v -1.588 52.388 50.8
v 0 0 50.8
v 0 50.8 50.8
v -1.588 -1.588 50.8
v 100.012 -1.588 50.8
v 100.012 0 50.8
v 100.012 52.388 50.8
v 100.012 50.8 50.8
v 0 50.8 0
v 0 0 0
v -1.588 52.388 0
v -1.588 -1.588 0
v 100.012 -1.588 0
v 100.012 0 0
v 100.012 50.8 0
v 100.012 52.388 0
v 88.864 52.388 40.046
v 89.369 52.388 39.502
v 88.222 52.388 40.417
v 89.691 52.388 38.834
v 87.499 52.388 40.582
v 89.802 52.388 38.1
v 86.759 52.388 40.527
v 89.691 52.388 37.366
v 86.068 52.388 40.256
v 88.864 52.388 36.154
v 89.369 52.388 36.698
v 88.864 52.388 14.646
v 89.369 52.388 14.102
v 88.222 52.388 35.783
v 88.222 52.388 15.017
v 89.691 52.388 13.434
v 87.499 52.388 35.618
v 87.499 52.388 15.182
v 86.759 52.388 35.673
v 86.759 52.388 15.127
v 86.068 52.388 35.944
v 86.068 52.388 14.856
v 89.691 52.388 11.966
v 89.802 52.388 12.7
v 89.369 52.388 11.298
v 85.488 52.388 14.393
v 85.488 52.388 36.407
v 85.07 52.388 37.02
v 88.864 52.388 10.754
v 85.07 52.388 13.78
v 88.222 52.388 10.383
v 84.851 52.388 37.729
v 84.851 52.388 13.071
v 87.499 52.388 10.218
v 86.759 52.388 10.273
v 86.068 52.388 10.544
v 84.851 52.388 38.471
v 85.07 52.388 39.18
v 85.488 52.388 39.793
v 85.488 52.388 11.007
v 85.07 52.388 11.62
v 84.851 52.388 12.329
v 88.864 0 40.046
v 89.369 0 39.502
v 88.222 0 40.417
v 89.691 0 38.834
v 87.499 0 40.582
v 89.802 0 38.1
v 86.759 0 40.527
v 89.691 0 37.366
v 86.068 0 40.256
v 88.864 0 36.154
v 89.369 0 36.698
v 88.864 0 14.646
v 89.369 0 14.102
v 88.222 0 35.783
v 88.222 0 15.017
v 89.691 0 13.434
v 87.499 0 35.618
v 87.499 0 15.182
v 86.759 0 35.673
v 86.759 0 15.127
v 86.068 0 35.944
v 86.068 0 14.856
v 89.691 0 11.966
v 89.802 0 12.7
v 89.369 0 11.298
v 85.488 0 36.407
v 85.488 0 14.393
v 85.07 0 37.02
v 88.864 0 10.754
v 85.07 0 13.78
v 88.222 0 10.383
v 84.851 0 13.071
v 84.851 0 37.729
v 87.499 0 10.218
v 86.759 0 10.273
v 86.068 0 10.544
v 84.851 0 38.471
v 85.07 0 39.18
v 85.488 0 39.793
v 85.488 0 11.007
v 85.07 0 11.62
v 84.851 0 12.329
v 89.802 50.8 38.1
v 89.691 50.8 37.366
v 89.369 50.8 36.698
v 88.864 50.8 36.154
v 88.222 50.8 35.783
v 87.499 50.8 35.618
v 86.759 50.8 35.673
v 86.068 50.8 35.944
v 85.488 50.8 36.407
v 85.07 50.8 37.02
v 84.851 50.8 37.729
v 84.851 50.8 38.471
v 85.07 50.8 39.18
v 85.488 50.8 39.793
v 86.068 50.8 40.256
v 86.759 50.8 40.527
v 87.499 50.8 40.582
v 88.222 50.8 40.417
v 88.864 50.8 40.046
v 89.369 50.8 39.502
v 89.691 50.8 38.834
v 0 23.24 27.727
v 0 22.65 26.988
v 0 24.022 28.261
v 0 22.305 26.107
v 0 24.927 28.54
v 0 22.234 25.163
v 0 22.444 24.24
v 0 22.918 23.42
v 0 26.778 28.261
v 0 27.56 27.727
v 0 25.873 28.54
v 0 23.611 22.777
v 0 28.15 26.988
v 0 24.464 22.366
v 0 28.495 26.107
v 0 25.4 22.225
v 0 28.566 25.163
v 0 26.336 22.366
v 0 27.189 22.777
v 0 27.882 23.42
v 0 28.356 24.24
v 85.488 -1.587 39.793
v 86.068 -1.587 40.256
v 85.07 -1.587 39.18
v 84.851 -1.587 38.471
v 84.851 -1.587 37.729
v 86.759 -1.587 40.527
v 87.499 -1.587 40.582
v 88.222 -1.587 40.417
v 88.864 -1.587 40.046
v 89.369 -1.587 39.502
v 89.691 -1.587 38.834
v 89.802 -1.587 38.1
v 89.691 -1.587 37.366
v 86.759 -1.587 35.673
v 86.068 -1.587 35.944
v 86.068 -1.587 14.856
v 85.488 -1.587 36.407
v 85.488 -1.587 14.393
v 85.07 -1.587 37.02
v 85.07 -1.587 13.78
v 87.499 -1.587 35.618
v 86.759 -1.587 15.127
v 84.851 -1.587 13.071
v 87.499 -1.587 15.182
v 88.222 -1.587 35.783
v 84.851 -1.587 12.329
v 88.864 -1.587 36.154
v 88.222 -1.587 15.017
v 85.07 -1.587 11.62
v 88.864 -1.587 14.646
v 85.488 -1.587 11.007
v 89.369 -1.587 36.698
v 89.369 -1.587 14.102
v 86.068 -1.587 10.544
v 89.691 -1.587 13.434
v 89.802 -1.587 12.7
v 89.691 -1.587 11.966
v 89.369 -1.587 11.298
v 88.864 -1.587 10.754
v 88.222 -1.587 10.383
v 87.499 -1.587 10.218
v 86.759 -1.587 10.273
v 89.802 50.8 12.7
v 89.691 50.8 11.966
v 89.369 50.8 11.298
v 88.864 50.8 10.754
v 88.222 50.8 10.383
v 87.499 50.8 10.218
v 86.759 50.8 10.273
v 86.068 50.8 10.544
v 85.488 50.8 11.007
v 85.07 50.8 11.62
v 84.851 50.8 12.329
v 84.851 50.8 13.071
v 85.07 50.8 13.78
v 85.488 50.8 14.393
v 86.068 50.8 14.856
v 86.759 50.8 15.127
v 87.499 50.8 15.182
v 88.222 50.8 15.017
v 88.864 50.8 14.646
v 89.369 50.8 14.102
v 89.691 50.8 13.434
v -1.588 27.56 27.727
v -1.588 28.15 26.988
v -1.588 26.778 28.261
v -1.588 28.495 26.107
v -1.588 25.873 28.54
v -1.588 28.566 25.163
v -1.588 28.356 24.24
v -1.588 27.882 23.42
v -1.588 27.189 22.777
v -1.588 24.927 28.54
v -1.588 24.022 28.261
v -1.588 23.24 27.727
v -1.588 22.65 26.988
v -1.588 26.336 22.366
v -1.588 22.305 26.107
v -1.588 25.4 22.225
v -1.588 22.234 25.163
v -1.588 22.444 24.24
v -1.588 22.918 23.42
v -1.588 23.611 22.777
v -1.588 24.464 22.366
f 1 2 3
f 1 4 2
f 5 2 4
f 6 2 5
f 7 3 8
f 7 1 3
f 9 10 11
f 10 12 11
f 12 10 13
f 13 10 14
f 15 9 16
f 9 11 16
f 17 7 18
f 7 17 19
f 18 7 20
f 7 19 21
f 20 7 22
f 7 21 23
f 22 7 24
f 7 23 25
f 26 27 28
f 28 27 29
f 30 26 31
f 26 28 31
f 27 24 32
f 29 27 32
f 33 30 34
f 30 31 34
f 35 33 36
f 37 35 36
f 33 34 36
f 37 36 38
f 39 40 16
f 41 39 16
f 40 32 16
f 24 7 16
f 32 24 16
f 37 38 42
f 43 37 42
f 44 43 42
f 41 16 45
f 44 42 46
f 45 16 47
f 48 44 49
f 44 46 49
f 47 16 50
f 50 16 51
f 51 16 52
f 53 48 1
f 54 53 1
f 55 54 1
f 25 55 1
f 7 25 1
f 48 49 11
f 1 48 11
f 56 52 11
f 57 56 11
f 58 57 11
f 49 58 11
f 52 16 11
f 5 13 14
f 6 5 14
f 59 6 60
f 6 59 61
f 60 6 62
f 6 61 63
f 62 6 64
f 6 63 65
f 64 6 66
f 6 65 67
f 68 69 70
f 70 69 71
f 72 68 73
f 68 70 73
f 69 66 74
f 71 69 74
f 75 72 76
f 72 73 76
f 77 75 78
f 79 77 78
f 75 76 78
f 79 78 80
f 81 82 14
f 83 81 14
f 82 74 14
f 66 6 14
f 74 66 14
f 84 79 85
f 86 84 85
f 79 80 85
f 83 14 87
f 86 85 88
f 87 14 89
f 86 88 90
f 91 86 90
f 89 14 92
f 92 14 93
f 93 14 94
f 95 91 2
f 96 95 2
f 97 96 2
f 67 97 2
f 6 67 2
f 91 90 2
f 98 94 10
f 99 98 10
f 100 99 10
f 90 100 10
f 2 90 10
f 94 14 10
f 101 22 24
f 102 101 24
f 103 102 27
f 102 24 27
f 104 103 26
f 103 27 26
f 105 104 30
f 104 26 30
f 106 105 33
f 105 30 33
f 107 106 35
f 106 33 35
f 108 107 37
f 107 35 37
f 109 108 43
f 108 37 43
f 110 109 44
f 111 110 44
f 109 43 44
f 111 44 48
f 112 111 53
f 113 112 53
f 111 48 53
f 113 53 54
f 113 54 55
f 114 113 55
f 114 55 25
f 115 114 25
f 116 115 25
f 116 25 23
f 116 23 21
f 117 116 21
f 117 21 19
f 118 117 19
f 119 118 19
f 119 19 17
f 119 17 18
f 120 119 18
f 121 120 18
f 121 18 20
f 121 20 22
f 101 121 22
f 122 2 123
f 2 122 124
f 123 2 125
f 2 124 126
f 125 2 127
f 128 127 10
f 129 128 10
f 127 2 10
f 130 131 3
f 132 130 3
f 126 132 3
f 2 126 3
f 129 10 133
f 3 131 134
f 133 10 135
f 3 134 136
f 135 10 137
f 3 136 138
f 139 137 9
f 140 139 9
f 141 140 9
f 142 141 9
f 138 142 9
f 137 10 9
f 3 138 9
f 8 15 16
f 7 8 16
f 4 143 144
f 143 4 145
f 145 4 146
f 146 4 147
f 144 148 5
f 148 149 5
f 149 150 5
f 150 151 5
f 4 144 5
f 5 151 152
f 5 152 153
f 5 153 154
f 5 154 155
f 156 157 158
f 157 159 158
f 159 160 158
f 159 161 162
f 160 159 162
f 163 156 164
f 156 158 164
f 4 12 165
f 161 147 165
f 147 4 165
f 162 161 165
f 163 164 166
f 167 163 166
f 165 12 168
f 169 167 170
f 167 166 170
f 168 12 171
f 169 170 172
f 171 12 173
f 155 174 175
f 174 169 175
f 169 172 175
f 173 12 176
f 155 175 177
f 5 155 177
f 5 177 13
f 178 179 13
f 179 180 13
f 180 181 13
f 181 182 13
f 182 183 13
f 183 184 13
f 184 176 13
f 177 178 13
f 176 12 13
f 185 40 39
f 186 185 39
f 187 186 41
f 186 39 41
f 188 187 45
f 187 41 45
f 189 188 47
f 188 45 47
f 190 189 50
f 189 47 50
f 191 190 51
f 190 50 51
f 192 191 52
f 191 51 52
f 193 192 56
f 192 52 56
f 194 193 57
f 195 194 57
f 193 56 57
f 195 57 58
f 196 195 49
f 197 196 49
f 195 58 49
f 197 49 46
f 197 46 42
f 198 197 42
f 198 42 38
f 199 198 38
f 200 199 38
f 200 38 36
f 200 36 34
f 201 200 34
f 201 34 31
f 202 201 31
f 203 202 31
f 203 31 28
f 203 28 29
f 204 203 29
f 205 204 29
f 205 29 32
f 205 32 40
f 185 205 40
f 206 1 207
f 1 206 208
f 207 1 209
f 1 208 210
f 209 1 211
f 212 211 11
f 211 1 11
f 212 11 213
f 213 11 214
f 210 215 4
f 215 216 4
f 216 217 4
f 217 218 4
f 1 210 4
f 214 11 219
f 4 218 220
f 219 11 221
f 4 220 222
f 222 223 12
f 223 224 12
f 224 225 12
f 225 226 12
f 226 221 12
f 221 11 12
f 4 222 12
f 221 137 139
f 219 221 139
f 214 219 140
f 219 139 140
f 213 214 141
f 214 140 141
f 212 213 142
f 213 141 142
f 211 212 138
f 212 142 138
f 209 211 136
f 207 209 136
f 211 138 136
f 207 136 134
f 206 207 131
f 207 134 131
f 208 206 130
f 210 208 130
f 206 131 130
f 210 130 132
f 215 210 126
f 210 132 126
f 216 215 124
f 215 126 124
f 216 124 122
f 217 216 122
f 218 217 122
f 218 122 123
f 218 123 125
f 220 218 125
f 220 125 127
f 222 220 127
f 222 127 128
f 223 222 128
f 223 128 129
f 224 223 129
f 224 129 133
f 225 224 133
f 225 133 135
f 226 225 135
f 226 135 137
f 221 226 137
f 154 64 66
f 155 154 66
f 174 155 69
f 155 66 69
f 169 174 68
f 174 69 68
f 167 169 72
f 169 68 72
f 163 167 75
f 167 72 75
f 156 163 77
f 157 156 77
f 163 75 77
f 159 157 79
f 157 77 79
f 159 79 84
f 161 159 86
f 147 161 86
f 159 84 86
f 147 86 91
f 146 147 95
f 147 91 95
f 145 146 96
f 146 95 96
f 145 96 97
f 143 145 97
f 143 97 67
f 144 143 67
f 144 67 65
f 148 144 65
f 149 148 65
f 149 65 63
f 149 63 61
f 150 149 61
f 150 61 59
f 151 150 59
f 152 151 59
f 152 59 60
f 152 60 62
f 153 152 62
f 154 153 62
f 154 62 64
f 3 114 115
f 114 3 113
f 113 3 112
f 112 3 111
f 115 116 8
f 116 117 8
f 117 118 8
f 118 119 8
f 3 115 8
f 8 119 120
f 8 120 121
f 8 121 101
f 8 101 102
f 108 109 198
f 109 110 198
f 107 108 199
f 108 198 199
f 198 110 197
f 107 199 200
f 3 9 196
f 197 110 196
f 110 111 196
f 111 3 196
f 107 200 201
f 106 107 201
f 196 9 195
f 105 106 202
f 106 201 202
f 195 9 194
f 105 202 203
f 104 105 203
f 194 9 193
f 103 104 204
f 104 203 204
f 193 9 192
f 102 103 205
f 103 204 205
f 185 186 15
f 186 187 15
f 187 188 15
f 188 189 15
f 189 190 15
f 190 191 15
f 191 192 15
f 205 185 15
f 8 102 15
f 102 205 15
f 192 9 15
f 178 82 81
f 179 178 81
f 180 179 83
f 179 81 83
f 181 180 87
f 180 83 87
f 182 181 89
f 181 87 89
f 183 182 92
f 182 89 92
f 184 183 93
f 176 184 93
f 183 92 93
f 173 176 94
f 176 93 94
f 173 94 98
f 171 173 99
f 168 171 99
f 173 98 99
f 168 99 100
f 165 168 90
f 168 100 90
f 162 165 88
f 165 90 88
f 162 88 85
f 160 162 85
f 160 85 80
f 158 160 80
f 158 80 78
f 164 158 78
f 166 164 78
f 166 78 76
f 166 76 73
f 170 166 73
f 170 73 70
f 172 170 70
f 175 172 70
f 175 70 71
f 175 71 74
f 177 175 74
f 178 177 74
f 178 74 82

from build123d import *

# Parameters (mm, degrees)
BOSS_EXTRUDE1_DEPTH = 50.8
SKETCH3_R           = 2.4892
CUT_EXTRUDE1_DEPTH  = 54.975
SKETCH4_R           = 3.175
CUT_EXTRUDE2_DEPTH  = 2.5875


with BuildPart() as part:
    # Sketch2 → Boss-Extrude1 (new body)
    with BuildSketch(Plane.XY):
        Polygon((-1.5875, -1.5875), (100.0125, -1.5875), (100.0125, 0), (0, 0), (0, 50.8), (100.0125, 50.8), (100.0125, 52.3875), (-1.5875, 52.3875), align=None)
    extrude(amount=BOSS_EXTRUDE1_DEPTH)

    # Sketch3 → Cut-Extrude1 (cut, through all)
    with BuildSketch(Plane(origin=(0, 52.3875, 0), x_dir=(1, 0, 0), z_dir=(0, 1, 0))):
        with Locations((87.3125, -38.1)):
            Circle(SKETCH3_R)
        with Locations((87.3125, -12.7)):
            Circle(SKETCH3_R)
    extrude(amount=-CUT_EXTRUDE1_DEPTH, mode=Mode.SUBTRACT)

    # Sketch4 → Cut-Extrude2 (cut, through all)
    with BuildSketch(Plane(origin=(0, 0, 0), x_dir=(0, 0, -1), z_dir=(1, 0, 0))):
        with Locations((-25.4, 25.4)):
            Circle(SKETCH4_R)
    extrude(amount=-CUT_EXTRUDE2_DEPTH, mode=Mode.SUBTRACT)


solid = part.part
